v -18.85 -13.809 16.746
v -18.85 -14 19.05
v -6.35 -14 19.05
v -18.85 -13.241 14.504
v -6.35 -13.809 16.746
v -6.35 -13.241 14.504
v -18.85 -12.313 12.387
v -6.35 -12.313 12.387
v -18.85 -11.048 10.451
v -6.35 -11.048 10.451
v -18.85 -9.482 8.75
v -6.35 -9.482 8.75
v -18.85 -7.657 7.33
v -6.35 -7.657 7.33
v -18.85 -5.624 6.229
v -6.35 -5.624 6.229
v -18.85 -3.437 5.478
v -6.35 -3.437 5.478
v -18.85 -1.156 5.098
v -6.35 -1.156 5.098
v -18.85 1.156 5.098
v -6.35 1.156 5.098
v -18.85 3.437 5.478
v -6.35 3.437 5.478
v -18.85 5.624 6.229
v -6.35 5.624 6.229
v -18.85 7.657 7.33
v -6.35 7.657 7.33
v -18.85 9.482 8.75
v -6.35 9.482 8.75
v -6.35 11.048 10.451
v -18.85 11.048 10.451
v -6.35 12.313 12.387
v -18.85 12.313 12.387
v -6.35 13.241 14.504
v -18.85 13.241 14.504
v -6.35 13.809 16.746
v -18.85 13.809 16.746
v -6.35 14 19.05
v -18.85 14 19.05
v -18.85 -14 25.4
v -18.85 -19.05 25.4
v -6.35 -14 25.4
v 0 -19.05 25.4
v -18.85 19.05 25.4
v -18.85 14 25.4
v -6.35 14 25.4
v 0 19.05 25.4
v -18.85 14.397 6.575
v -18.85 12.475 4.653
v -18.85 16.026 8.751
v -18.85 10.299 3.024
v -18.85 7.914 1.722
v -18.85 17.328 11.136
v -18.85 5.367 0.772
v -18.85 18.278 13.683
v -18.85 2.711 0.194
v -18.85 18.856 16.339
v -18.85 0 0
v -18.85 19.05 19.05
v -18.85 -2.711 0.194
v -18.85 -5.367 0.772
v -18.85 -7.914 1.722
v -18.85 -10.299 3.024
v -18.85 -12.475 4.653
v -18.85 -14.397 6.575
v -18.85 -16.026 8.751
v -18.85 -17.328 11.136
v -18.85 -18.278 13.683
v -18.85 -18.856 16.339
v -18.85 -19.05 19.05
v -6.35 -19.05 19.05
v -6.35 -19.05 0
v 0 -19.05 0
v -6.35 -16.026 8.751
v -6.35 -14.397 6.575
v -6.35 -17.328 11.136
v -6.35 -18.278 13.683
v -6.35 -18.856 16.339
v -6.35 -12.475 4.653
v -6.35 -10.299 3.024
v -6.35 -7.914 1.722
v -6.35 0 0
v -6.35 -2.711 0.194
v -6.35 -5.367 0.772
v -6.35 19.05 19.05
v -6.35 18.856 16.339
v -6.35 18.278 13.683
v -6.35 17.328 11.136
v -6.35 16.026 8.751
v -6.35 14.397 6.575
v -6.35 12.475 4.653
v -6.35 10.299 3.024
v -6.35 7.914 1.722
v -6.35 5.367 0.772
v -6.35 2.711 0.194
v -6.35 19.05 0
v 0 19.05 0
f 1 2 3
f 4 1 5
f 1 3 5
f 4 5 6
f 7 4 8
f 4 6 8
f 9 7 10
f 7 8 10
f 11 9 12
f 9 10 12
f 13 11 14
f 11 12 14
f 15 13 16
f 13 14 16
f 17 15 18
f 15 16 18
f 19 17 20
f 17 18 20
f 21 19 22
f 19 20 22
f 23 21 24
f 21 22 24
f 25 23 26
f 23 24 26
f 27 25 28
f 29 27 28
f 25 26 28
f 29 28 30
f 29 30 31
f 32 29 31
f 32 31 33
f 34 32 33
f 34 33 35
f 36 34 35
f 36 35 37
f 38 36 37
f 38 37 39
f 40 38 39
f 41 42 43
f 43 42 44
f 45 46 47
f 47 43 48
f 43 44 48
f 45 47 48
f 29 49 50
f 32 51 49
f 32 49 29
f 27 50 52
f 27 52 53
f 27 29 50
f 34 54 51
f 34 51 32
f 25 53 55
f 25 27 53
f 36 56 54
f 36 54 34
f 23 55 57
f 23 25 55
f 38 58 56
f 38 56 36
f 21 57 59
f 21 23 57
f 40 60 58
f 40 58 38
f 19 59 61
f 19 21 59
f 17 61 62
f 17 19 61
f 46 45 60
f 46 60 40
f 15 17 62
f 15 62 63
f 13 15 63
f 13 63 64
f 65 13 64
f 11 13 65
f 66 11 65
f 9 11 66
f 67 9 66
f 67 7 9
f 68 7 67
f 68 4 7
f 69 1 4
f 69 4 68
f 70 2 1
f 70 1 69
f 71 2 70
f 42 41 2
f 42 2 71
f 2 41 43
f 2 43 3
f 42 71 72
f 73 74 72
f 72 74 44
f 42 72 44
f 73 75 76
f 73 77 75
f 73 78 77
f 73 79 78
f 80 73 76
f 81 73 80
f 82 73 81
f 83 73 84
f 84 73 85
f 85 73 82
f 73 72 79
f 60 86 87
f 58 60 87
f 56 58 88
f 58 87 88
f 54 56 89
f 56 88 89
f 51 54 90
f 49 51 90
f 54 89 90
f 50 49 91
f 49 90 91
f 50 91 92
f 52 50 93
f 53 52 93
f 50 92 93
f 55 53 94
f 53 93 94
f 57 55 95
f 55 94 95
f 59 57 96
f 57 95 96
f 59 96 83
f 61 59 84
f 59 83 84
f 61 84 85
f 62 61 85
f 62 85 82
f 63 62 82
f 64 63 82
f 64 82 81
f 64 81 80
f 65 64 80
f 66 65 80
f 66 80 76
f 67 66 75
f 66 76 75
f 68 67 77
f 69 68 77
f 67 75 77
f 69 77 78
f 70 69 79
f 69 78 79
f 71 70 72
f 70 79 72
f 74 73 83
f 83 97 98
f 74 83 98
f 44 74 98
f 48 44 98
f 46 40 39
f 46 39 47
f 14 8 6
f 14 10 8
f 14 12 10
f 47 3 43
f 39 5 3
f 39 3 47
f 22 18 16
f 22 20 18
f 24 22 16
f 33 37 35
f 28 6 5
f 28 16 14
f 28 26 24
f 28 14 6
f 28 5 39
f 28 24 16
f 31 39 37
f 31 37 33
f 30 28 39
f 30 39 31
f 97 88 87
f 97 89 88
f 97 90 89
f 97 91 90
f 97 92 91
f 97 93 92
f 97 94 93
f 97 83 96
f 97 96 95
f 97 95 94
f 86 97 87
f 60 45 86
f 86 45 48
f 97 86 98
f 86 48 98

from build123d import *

# Parameters (mm, degrees)
F0_W     = 6.35
F0_H     = 38.1
F1_DEPTH = 25.4
F3_DEPTH = 12.5


with BuildPart() as f1:
    # F0 (on Top) → F1 (new body)
    with BuildSketch(Plane.XY):
        with Locations((-3.175, 0)):
            Rectangle(F0_W, F0_H)
    extrude(amount=F1_DEPTH)

    # F2 (on face) → F3 (join)
    with BuildSketch(Plane(origin=(-6.35, 0, 0), x_dir=(0, -1, 0), z_dir=(-1, 0, 0))):
        with BuildLine():
            Line((-19.05, 25.4), (-19.05, 19.05))
            ThreePointArc((-19.05, 19.05), (0, 0), (19.05, 19.05))
            Line((19.05, 19.05), (19.05, 25.4))
            Line((19.05, 25.4), (14, 25.4))
            Line((14, 25.4), (14, 19.05))
            ThreePointArc((14, 19.05), (0, 5.05), (-14, 19.05))
            Line((-14, 19.05), (-14, 25.4))
            Line((-14, 25.4), (-19.05, 25.4))
        make_face()
    extrude(amount=F3_DEPTH)


solid = f1.part
